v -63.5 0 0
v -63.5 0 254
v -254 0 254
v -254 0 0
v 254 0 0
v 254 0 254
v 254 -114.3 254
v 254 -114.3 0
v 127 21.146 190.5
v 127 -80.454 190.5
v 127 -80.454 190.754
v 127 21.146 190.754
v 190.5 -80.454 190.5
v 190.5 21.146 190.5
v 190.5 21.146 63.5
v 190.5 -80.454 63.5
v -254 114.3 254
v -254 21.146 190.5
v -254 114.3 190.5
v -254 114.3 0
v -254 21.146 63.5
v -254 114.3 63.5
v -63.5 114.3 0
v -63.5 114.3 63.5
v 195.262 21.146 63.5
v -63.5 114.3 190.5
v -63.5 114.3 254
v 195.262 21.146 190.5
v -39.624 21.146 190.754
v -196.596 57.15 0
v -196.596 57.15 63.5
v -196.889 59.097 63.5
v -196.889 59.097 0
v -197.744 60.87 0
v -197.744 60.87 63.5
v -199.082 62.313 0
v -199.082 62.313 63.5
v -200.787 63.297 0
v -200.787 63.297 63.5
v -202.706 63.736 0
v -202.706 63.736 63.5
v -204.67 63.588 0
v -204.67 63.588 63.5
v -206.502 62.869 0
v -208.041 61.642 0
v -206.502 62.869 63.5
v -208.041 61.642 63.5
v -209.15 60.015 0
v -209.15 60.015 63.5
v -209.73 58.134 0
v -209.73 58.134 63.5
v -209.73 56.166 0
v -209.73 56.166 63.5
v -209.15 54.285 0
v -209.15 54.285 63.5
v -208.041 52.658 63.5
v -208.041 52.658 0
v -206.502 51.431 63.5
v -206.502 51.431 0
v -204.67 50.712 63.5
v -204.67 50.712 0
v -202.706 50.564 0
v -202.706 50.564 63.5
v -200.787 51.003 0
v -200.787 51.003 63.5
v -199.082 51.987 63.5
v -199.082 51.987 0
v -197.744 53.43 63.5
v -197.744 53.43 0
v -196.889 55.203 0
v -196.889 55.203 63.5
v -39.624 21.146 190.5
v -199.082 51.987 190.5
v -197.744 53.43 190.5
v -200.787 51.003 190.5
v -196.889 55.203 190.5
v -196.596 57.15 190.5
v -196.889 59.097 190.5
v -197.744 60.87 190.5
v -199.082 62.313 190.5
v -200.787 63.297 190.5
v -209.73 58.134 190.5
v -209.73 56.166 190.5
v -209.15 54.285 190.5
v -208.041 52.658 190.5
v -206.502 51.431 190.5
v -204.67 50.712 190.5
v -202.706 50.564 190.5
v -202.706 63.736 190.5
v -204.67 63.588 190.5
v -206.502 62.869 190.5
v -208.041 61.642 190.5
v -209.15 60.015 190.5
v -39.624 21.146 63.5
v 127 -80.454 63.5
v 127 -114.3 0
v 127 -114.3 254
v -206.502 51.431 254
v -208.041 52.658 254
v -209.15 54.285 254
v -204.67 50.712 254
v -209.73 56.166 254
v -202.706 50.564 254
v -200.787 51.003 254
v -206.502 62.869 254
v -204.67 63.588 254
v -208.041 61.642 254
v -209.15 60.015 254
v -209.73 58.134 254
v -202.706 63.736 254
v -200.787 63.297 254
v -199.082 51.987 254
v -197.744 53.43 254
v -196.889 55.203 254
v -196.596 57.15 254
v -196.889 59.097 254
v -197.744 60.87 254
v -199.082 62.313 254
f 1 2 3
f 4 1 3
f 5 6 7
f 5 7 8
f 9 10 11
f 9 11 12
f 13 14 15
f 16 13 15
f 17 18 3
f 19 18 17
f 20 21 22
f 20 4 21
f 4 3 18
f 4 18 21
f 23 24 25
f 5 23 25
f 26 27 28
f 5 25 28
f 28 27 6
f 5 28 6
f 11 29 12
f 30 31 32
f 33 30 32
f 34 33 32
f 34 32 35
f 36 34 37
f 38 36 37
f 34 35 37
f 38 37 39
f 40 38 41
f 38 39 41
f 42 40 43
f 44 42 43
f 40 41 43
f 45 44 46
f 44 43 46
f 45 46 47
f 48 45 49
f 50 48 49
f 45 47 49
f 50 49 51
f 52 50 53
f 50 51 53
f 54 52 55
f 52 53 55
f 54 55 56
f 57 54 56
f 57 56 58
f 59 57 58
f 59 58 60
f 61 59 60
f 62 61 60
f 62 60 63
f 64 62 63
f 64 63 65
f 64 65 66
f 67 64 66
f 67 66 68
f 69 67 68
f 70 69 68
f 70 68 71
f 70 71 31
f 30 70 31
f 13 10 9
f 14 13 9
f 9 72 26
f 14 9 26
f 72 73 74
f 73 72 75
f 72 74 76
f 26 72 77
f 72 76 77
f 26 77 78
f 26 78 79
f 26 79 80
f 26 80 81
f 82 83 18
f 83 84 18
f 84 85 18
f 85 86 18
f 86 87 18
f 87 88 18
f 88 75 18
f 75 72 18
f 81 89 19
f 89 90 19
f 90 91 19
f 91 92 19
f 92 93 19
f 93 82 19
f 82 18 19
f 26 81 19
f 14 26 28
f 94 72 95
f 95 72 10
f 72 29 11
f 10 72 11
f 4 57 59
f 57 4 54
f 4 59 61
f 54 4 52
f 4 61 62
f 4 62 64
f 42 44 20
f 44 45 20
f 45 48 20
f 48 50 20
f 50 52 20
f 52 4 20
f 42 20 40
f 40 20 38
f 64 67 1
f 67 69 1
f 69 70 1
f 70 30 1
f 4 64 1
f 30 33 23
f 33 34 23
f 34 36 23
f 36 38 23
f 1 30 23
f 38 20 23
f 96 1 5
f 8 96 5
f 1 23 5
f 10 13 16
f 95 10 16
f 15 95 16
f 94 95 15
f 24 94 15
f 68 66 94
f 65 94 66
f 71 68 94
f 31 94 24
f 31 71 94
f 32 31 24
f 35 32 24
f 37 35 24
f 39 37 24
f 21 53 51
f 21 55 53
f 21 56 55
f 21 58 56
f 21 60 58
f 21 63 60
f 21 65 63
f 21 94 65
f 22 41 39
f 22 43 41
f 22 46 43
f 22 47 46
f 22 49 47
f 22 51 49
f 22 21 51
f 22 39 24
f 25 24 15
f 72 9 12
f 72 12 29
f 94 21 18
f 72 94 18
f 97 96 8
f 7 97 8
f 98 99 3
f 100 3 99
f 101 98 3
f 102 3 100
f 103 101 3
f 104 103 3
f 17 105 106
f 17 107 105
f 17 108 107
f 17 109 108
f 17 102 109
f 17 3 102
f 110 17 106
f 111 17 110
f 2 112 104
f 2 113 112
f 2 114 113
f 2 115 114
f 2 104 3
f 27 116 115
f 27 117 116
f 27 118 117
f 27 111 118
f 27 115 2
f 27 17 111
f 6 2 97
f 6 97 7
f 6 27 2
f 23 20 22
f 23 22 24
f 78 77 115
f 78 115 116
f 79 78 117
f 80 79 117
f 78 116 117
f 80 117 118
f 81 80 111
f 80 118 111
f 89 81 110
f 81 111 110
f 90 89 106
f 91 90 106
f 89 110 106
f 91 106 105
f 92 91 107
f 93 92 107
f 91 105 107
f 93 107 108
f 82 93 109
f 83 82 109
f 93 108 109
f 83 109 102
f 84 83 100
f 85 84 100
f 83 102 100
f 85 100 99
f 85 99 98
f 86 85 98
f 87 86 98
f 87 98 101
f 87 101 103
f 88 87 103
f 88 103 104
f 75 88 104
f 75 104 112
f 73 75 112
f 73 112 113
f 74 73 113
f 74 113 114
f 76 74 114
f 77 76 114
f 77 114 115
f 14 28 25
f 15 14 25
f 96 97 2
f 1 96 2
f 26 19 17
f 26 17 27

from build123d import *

# Parameters (mm, degrees)
SKETCH1_W               = 508
SKETCH1_H               = 228.6
BOSS_EXTRUDE1_DEPTH     = 254
SKETCH2_W               = 127
SKETCH2_H               = 93.154290468
CUT_EXTRUDE1_DEPTH      = 509
CUT_EXTRUDE2_DEPTH      = 254
SKETCH7_W               = 127
SKETCH7_H               = 101.6
CUT_EXTRUDE3_DEPTH      = 127
CUT_EXTRUDE5_DEPTH      = 127
CUT_EXTRUDE5_DEPTH_BACK = 0.254
SKETCH24_W              = 127
SKETCH24_H              = 101.6
BOSS_EXTRUDE3_DEPTH     = 63.5
CUT_EXTRUDE7_DEPTH      = 315.976
SKETCH27_R              = 6.604
CUT_EXTRUDE8_DEPTH      = 315.976


with BuildPart() as part:
    # Sketch1 → Boss-Extrude1 (new body)
    with BuildSketch(Plane.XY):
        Rectangle(SKETCH1_W, SKETCH1_H)
    extrude(amount=BOSS_EXTRUDE1_DEPTH)

    # Sketch2 → Cut-Extrude1 (cut, through all)
    with BuildSketch(Plane.ZY.offset(254)):
        with Locations((127, 67.722854766)):
            Rectangle(SKETCH2_W, SKETCH2_H)
    extrude(amount=-CUT_EXTRUDE1_DEPTH, mode=Mode.SUBTRACT)

    # Sketch5 → Cut-Extrude2 (cut)
    with BuildSketch(Plane.XY.offset(254)):
        Polygon((-254, 0), (-254, -114.3), (127, -114.3), (-63.5, 0), align=None)
    extrude(amount=-CUT_EXTRUDE2_DEPTH, mode=Mode.SUBTRACT)

    # Sketch7 → Cut-Extrude3 (cut)
    with BuildSketch(Plane(origin=(254, 0, 0), x_dir=(0, 0, -1), z_dir=(1, 0, 0))):
        with Locations((-127, -29.654290468)):
            Rectangle(SKETCH7_W, SKETCH7_H)
    extrude(amount=-CUT_EXTRUDE3_DEPTH, mode=Mode.SUBTRACT)

    # Sketch20 → Cut-Extrude5 (cut, two sides)
    with BuildSketch(Plane(origin=(0, 0, 190.5), x_dir=(-1, 0, 0), z_dir=(0, 0, -1))) as cut_extrude5_sk:
        Polygon((-127, 21.145709532), (39.624, 21.145709532), (-127, -80.454290468), align=None)
    extrude(amount=CUT_EXTRUDE5_DEPTH, mode=Mode.SUBTRACT)
    extrude(cut_extrude5_sk.sketch, amount=-CUT_EXTRUDE5_DEPTH_BACK, mode=Mode.SUBTRACT)

    # Sketch24 → Boss-Extrude3 (add)
    with BuildSketch(Plane(origin=(254, 0, 0), x_dir=(0, 0, -1), z_dir=(1, 0, 0))):
        with Locations((-127, -29.654290468)):
            Rectangle(SKETCH24_W, SKETCH24_H)
    extrude(amount=-BOSS_EXTRUDE3_DEPTH)

    # Sketch26 → Cut-Extrude7 (cut)
    with BuildSketch(Plane.XY.offset(254)):
        Polygon((254, 114.3), (-63.5, 114.3), (254, 0), align=None)
    extrude(amount=-CUT_EXTRUDE7_DEPTH, mode=Mode.SUBTRACT)

    # Sketch27 → Cut-Extrude8 (cut)
    with BuildSketch(Plane.XY.offset(254)):
        with Locations((-203.2, 57.15)):
            Circle(SKETCH27_R)
    extrude(amount=-CUT_EXTRUDE8_DEPTH, mode=Mode.SUBTRACT)


solid = part.part
